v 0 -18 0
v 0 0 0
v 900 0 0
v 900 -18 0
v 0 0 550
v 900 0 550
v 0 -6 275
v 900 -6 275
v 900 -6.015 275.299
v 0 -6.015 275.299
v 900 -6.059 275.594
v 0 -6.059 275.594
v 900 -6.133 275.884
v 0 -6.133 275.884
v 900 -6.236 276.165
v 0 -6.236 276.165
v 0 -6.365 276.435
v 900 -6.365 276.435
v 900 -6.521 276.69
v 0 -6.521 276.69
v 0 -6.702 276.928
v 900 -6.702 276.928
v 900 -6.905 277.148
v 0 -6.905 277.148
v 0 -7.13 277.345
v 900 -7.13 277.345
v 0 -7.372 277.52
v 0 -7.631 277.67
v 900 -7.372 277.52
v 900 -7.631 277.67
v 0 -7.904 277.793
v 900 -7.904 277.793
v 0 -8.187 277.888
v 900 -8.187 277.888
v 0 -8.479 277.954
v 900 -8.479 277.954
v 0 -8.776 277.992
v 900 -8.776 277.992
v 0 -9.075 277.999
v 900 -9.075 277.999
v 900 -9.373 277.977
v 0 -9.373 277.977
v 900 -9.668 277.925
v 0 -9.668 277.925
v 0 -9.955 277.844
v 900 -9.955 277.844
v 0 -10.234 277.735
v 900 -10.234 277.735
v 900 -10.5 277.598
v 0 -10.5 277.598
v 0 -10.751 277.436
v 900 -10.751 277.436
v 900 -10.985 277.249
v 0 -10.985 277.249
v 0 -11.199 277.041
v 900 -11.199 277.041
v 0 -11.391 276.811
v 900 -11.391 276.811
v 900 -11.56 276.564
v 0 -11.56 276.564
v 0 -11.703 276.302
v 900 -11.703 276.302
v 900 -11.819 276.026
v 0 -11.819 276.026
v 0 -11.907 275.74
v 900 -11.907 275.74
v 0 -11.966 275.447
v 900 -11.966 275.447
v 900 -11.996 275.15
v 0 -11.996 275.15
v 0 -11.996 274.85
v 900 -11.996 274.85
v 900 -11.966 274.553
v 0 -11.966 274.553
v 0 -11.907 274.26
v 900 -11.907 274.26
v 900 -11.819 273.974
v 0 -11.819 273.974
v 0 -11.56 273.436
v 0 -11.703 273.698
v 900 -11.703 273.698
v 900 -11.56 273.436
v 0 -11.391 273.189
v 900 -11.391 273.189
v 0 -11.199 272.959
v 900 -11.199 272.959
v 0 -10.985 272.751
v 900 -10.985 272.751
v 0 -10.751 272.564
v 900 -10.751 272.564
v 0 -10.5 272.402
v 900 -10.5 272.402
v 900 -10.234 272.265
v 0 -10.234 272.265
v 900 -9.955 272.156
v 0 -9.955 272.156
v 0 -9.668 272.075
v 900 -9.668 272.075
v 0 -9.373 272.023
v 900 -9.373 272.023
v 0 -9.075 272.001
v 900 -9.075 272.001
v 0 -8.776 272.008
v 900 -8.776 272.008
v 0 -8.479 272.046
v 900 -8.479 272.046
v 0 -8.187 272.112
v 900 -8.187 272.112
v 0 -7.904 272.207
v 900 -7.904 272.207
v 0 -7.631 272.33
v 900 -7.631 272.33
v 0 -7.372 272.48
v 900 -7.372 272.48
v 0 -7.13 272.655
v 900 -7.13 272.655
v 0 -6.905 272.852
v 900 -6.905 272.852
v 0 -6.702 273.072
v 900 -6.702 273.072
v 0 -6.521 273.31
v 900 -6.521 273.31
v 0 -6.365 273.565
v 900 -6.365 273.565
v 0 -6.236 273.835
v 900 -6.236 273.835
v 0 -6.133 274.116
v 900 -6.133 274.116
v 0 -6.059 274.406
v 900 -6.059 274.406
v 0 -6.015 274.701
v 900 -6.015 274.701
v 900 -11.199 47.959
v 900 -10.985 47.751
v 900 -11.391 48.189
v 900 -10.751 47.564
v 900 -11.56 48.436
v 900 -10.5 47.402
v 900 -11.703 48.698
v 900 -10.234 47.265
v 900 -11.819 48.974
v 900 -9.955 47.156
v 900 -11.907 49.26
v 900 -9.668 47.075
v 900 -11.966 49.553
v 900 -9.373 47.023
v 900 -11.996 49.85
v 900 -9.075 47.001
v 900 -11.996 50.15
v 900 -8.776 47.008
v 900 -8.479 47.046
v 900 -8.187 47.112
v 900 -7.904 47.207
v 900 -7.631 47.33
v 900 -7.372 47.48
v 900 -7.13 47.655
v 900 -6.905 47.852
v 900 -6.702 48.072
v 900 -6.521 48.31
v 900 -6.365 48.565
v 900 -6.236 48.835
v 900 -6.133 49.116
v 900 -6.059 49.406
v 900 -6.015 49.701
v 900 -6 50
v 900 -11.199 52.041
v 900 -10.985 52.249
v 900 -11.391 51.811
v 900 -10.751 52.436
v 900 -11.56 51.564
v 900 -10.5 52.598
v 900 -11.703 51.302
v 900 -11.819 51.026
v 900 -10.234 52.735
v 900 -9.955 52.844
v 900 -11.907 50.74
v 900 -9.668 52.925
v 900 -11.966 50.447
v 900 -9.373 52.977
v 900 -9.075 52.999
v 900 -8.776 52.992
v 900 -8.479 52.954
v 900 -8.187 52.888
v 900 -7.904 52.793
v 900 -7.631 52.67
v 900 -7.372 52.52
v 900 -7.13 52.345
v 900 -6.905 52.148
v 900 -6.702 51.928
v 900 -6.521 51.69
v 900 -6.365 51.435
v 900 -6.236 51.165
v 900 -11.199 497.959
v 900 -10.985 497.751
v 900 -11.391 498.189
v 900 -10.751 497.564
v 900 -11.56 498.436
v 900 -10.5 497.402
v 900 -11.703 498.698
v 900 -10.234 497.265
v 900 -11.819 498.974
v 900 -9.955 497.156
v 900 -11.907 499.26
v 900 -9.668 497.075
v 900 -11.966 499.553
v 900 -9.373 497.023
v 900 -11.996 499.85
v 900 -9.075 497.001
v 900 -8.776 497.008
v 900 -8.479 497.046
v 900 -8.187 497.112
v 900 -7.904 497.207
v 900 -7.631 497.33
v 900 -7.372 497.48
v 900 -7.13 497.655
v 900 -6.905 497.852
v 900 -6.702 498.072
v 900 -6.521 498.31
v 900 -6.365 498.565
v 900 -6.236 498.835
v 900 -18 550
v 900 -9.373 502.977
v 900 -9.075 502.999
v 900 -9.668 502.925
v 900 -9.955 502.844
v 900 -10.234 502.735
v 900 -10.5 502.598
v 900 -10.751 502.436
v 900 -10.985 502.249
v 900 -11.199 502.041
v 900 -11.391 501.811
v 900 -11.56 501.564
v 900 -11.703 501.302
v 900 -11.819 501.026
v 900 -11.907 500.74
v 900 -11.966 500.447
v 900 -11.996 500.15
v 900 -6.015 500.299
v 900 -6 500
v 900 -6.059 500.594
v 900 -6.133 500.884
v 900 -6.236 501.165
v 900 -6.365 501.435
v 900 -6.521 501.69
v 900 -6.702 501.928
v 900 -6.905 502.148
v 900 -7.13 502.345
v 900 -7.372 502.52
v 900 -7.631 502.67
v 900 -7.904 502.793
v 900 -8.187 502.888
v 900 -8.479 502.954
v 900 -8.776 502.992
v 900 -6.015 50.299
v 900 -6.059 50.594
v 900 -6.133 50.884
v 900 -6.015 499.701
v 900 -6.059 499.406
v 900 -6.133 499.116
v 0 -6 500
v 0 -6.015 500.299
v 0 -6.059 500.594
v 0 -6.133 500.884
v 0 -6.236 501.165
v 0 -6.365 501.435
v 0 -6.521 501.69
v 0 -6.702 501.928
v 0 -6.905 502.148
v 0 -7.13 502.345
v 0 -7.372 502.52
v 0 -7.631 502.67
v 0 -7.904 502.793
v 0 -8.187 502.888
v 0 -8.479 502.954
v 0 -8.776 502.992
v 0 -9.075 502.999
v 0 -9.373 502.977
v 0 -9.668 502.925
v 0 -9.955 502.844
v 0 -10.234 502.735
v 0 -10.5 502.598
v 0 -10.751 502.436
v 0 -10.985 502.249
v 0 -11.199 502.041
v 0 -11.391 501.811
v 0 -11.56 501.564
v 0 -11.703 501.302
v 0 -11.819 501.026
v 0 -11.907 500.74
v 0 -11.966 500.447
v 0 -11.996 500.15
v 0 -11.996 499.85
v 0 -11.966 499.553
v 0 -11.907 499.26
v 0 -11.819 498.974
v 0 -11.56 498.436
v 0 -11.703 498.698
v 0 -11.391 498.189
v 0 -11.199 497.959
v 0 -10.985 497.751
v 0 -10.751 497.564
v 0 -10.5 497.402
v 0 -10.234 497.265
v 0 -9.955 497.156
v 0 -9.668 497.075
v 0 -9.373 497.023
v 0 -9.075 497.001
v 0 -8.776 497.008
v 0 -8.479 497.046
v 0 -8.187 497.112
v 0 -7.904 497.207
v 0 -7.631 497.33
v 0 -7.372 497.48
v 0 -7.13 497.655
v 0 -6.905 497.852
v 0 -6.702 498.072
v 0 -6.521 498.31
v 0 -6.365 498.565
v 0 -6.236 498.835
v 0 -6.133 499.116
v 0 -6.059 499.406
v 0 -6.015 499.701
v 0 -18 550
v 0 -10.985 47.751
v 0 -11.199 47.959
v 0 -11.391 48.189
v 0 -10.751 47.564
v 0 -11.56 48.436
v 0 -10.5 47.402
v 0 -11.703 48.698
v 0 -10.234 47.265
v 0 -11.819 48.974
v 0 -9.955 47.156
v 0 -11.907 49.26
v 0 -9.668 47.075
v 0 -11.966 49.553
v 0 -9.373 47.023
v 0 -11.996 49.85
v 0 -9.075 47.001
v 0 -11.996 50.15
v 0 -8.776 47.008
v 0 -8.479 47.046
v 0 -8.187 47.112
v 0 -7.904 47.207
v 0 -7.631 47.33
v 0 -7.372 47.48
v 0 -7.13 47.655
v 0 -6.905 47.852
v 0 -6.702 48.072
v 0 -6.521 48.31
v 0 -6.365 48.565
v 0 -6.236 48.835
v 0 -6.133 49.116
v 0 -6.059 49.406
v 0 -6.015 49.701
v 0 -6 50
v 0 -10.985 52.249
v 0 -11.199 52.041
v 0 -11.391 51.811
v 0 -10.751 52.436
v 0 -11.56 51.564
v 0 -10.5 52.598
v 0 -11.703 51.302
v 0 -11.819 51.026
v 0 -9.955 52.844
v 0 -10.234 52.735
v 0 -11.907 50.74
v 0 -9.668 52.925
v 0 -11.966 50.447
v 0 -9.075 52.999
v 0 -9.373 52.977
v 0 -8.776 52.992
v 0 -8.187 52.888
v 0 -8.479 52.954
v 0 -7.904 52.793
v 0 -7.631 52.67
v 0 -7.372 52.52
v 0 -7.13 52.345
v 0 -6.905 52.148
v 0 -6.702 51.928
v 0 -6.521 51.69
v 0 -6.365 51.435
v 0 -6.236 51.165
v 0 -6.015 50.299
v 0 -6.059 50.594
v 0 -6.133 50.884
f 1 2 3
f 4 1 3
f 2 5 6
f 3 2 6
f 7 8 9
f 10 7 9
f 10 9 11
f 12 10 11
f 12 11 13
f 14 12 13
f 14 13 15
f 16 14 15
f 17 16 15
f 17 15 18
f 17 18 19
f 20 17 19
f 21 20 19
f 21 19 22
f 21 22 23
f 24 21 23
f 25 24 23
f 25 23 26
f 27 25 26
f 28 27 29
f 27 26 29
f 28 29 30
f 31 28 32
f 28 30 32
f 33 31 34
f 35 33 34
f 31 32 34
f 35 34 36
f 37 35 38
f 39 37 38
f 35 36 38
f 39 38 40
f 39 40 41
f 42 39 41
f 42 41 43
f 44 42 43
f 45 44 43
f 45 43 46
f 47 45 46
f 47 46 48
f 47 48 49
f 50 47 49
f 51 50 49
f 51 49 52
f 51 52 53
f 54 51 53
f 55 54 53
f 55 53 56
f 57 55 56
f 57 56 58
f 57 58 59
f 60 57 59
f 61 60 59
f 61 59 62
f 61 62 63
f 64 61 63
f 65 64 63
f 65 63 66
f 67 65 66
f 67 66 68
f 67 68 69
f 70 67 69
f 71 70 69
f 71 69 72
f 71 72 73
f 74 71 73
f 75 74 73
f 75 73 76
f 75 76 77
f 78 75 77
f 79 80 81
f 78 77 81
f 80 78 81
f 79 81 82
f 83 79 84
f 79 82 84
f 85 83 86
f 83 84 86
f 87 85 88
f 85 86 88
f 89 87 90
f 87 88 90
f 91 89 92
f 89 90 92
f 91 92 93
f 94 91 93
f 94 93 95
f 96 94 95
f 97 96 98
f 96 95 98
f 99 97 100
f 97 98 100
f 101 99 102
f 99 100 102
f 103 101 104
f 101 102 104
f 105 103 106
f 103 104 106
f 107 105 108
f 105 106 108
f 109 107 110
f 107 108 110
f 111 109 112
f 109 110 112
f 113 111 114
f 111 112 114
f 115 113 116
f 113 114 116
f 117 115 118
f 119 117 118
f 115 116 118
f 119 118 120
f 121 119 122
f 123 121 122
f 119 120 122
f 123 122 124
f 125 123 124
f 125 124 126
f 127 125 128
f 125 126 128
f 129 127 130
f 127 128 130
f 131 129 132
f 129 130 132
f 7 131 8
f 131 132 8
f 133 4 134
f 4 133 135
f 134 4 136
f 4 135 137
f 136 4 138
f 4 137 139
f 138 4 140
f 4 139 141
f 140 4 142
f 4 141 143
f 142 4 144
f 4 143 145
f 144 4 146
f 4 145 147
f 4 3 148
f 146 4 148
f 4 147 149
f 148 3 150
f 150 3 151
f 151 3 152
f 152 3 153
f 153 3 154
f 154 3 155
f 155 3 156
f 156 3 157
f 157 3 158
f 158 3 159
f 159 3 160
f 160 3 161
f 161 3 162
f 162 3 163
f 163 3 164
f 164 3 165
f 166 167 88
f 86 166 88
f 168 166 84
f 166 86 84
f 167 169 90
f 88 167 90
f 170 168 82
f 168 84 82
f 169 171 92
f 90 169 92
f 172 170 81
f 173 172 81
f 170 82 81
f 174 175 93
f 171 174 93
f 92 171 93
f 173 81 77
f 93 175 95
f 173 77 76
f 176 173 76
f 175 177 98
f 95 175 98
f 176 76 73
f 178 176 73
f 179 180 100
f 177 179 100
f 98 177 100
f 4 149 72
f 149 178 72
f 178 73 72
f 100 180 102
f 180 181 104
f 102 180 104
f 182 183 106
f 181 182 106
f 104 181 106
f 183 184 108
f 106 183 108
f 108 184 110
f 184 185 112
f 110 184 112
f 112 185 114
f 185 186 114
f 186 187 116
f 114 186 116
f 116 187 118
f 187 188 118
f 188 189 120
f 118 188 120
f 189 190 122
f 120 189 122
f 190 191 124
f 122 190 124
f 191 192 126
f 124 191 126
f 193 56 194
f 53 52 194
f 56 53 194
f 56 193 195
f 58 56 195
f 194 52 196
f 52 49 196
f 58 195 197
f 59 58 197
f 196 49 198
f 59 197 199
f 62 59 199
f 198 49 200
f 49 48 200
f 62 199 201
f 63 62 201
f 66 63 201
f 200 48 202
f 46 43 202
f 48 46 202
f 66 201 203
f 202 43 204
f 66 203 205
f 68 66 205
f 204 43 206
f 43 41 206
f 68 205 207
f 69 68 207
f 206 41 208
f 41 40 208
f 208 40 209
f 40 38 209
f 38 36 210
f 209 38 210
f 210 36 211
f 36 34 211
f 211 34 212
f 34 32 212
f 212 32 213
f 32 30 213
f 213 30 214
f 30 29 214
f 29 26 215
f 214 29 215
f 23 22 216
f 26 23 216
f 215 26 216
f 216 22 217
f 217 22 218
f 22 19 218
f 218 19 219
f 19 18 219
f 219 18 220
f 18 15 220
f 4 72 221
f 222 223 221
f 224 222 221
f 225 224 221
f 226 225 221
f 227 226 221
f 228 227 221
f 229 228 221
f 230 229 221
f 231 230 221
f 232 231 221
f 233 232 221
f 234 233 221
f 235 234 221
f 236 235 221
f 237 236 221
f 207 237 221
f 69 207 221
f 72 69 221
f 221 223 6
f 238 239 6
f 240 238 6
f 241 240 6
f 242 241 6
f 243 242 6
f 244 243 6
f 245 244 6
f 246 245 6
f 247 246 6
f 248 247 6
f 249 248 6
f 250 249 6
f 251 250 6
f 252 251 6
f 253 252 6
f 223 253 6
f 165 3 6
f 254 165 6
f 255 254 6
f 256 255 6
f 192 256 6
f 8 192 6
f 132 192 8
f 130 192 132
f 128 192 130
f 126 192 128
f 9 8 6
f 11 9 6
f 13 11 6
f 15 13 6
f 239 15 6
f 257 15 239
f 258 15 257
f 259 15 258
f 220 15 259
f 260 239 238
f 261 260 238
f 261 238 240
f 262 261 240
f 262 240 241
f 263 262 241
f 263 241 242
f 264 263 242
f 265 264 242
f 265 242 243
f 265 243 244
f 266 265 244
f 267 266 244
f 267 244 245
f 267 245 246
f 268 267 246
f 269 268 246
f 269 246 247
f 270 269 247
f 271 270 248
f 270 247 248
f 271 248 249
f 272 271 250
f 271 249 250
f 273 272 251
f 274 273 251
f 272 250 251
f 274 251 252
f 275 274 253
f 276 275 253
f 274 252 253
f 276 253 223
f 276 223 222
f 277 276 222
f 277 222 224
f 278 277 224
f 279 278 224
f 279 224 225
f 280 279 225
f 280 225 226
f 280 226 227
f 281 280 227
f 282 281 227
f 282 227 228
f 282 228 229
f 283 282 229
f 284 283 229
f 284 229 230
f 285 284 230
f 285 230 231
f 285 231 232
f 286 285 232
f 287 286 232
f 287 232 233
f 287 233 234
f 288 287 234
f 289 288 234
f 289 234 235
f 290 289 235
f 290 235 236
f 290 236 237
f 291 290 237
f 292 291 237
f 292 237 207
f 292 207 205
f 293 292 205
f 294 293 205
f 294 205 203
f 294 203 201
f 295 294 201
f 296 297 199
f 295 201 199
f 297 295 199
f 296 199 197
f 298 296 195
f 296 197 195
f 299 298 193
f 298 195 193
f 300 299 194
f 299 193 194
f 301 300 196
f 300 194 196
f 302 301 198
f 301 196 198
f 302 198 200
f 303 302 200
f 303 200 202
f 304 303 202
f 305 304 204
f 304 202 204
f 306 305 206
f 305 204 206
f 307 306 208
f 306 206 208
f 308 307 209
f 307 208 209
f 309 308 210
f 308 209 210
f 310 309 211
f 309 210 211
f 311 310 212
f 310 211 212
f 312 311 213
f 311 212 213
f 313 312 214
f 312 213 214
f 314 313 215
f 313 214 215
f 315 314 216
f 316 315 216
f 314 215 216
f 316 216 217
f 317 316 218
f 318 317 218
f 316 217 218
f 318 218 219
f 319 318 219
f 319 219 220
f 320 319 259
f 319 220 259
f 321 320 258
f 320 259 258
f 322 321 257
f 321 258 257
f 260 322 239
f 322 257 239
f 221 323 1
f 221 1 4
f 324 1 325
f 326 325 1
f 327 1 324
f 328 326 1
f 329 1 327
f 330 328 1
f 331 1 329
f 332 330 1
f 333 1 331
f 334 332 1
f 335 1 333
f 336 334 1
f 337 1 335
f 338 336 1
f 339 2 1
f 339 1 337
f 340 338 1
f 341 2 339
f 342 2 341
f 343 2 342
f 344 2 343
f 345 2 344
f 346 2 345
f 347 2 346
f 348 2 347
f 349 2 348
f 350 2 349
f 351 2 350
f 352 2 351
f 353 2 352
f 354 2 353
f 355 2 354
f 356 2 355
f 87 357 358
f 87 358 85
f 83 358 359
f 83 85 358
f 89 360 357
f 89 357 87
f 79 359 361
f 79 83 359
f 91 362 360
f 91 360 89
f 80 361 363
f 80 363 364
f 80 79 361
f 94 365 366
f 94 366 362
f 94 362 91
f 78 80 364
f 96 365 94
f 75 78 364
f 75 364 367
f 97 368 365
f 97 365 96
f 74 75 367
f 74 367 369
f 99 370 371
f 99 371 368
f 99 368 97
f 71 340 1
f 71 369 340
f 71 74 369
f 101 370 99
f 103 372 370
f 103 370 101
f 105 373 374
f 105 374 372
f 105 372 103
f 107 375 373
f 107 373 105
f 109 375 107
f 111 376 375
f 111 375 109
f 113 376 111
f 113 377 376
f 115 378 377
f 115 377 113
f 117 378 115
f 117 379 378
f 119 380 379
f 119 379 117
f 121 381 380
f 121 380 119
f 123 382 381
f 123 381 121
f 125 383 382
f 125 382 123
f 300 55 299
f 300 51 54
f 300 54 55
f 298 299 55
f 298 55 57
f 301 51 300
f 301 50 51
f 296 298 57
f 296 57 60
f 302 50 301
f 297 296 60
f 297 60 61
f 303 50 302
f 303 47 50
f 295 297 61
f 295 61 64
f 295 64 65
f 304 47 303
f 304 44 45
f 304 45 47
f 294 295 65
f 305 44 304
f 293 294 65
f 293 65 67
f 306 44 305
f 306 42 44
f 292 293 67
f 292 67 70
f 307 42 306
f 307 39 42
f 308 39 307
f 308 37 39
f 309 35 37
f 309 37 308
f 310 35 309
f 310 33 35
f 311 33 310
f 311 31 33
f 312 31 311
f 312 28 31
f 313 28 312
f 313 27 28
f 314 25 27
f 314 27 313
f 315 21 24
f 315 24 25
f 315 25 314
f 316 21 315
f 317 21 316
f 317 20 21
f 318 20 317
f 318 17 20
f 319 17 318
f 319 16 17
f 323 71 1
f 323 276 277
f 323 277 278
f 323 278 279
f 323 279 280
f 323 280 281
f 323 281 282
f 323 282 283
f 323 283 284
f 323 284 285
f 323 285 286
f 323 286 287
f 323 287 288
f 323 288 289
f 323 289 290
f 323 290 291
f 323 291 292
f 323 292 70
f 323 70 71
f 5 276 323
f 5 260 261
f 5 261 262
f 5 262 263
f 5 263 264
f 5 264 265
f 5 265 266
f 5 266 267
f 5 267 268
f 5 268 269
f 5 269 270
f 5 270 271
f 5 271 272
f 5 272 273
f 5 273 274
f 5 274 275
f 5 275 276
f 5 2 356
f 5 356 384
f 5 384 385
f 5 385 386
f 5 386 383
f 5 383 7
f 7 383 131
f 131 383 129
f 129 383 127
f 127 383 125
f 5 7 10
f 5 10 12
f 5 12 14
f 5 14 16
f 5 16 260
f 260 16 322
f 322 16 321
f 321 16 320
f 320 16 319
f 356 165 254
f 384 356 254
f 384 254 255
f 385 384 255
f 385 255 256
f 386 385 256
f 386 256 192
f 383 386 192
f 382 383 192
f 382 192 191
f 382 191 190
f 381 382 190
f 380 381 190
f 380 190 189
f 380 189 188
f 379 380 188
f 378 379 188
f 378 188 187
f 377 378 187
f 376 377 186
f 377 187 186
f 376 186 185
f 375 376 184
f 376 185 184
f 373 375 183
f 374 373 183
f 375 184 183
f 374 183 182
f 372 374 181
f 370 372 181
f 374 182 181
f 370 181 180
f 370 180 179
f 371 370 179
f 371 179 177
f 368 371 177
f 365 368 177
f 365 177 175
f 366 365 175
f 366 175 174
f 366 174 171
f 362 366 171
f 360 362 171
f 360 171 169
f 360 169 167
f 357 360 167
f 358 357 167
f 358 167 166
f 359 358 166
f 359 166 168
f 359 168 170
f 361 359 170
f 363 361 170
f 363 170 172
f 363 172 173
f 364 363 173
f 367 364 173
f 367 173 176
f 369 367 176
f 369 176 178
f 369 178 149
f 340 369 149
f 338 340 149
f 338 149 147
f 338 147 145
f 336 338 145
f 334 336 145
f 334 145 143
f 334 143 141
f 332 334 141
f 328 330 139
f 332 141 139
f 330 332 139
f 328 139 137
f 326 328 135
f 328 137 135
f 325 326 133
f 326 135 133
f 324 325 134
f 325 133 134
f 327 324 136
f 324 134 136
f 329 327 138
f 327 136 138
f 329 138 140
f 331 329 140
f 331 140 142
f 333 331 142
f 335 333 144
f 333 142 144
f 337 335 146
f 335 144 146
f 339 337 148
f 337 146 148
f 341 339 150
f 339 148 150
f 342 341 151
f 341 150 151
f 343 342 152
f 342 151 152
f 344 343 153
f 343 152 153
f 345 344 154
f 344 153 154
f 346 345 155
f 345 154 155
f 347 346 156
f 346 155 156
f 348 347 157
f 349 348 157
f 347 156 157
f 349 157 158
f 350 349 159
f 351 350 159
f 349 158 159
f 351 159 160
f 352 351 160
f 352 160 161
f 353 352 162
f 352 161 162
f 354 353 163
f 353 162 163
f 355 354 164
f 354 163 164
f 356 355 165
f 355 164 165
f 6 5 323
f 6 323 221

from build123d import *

# Parameters (mm, degrees)
F0_W     = 900
F0_H     = 550
F1_DEPTH = 18
F2_R     = 3
F3_DEPTH = 900.001


with BuildPart() as f1:
    # F0 (on Front) → F1 (new body)
    with BuildSketch(Plane.XZ):
        with Locations((450, 275)):
            Rectangle(F0_W, F0_H)
    extrude(amount=F1_DEPTH)

    # F2 (on face) → F3 (cut, through all)
    with BuildSketch(Plane.YZ.offset(900)):
        with Locations((-9, 50)):
            Circle(F2_R)
        with Locations((-9, 275)):
            Circle(F2_R)
        with Locations((-9, 500)):
            Circle(F2_R)
    extrude(amount=-F3_DEPTH, mode=Mode.SUBTRACT)


solid = f1.part
